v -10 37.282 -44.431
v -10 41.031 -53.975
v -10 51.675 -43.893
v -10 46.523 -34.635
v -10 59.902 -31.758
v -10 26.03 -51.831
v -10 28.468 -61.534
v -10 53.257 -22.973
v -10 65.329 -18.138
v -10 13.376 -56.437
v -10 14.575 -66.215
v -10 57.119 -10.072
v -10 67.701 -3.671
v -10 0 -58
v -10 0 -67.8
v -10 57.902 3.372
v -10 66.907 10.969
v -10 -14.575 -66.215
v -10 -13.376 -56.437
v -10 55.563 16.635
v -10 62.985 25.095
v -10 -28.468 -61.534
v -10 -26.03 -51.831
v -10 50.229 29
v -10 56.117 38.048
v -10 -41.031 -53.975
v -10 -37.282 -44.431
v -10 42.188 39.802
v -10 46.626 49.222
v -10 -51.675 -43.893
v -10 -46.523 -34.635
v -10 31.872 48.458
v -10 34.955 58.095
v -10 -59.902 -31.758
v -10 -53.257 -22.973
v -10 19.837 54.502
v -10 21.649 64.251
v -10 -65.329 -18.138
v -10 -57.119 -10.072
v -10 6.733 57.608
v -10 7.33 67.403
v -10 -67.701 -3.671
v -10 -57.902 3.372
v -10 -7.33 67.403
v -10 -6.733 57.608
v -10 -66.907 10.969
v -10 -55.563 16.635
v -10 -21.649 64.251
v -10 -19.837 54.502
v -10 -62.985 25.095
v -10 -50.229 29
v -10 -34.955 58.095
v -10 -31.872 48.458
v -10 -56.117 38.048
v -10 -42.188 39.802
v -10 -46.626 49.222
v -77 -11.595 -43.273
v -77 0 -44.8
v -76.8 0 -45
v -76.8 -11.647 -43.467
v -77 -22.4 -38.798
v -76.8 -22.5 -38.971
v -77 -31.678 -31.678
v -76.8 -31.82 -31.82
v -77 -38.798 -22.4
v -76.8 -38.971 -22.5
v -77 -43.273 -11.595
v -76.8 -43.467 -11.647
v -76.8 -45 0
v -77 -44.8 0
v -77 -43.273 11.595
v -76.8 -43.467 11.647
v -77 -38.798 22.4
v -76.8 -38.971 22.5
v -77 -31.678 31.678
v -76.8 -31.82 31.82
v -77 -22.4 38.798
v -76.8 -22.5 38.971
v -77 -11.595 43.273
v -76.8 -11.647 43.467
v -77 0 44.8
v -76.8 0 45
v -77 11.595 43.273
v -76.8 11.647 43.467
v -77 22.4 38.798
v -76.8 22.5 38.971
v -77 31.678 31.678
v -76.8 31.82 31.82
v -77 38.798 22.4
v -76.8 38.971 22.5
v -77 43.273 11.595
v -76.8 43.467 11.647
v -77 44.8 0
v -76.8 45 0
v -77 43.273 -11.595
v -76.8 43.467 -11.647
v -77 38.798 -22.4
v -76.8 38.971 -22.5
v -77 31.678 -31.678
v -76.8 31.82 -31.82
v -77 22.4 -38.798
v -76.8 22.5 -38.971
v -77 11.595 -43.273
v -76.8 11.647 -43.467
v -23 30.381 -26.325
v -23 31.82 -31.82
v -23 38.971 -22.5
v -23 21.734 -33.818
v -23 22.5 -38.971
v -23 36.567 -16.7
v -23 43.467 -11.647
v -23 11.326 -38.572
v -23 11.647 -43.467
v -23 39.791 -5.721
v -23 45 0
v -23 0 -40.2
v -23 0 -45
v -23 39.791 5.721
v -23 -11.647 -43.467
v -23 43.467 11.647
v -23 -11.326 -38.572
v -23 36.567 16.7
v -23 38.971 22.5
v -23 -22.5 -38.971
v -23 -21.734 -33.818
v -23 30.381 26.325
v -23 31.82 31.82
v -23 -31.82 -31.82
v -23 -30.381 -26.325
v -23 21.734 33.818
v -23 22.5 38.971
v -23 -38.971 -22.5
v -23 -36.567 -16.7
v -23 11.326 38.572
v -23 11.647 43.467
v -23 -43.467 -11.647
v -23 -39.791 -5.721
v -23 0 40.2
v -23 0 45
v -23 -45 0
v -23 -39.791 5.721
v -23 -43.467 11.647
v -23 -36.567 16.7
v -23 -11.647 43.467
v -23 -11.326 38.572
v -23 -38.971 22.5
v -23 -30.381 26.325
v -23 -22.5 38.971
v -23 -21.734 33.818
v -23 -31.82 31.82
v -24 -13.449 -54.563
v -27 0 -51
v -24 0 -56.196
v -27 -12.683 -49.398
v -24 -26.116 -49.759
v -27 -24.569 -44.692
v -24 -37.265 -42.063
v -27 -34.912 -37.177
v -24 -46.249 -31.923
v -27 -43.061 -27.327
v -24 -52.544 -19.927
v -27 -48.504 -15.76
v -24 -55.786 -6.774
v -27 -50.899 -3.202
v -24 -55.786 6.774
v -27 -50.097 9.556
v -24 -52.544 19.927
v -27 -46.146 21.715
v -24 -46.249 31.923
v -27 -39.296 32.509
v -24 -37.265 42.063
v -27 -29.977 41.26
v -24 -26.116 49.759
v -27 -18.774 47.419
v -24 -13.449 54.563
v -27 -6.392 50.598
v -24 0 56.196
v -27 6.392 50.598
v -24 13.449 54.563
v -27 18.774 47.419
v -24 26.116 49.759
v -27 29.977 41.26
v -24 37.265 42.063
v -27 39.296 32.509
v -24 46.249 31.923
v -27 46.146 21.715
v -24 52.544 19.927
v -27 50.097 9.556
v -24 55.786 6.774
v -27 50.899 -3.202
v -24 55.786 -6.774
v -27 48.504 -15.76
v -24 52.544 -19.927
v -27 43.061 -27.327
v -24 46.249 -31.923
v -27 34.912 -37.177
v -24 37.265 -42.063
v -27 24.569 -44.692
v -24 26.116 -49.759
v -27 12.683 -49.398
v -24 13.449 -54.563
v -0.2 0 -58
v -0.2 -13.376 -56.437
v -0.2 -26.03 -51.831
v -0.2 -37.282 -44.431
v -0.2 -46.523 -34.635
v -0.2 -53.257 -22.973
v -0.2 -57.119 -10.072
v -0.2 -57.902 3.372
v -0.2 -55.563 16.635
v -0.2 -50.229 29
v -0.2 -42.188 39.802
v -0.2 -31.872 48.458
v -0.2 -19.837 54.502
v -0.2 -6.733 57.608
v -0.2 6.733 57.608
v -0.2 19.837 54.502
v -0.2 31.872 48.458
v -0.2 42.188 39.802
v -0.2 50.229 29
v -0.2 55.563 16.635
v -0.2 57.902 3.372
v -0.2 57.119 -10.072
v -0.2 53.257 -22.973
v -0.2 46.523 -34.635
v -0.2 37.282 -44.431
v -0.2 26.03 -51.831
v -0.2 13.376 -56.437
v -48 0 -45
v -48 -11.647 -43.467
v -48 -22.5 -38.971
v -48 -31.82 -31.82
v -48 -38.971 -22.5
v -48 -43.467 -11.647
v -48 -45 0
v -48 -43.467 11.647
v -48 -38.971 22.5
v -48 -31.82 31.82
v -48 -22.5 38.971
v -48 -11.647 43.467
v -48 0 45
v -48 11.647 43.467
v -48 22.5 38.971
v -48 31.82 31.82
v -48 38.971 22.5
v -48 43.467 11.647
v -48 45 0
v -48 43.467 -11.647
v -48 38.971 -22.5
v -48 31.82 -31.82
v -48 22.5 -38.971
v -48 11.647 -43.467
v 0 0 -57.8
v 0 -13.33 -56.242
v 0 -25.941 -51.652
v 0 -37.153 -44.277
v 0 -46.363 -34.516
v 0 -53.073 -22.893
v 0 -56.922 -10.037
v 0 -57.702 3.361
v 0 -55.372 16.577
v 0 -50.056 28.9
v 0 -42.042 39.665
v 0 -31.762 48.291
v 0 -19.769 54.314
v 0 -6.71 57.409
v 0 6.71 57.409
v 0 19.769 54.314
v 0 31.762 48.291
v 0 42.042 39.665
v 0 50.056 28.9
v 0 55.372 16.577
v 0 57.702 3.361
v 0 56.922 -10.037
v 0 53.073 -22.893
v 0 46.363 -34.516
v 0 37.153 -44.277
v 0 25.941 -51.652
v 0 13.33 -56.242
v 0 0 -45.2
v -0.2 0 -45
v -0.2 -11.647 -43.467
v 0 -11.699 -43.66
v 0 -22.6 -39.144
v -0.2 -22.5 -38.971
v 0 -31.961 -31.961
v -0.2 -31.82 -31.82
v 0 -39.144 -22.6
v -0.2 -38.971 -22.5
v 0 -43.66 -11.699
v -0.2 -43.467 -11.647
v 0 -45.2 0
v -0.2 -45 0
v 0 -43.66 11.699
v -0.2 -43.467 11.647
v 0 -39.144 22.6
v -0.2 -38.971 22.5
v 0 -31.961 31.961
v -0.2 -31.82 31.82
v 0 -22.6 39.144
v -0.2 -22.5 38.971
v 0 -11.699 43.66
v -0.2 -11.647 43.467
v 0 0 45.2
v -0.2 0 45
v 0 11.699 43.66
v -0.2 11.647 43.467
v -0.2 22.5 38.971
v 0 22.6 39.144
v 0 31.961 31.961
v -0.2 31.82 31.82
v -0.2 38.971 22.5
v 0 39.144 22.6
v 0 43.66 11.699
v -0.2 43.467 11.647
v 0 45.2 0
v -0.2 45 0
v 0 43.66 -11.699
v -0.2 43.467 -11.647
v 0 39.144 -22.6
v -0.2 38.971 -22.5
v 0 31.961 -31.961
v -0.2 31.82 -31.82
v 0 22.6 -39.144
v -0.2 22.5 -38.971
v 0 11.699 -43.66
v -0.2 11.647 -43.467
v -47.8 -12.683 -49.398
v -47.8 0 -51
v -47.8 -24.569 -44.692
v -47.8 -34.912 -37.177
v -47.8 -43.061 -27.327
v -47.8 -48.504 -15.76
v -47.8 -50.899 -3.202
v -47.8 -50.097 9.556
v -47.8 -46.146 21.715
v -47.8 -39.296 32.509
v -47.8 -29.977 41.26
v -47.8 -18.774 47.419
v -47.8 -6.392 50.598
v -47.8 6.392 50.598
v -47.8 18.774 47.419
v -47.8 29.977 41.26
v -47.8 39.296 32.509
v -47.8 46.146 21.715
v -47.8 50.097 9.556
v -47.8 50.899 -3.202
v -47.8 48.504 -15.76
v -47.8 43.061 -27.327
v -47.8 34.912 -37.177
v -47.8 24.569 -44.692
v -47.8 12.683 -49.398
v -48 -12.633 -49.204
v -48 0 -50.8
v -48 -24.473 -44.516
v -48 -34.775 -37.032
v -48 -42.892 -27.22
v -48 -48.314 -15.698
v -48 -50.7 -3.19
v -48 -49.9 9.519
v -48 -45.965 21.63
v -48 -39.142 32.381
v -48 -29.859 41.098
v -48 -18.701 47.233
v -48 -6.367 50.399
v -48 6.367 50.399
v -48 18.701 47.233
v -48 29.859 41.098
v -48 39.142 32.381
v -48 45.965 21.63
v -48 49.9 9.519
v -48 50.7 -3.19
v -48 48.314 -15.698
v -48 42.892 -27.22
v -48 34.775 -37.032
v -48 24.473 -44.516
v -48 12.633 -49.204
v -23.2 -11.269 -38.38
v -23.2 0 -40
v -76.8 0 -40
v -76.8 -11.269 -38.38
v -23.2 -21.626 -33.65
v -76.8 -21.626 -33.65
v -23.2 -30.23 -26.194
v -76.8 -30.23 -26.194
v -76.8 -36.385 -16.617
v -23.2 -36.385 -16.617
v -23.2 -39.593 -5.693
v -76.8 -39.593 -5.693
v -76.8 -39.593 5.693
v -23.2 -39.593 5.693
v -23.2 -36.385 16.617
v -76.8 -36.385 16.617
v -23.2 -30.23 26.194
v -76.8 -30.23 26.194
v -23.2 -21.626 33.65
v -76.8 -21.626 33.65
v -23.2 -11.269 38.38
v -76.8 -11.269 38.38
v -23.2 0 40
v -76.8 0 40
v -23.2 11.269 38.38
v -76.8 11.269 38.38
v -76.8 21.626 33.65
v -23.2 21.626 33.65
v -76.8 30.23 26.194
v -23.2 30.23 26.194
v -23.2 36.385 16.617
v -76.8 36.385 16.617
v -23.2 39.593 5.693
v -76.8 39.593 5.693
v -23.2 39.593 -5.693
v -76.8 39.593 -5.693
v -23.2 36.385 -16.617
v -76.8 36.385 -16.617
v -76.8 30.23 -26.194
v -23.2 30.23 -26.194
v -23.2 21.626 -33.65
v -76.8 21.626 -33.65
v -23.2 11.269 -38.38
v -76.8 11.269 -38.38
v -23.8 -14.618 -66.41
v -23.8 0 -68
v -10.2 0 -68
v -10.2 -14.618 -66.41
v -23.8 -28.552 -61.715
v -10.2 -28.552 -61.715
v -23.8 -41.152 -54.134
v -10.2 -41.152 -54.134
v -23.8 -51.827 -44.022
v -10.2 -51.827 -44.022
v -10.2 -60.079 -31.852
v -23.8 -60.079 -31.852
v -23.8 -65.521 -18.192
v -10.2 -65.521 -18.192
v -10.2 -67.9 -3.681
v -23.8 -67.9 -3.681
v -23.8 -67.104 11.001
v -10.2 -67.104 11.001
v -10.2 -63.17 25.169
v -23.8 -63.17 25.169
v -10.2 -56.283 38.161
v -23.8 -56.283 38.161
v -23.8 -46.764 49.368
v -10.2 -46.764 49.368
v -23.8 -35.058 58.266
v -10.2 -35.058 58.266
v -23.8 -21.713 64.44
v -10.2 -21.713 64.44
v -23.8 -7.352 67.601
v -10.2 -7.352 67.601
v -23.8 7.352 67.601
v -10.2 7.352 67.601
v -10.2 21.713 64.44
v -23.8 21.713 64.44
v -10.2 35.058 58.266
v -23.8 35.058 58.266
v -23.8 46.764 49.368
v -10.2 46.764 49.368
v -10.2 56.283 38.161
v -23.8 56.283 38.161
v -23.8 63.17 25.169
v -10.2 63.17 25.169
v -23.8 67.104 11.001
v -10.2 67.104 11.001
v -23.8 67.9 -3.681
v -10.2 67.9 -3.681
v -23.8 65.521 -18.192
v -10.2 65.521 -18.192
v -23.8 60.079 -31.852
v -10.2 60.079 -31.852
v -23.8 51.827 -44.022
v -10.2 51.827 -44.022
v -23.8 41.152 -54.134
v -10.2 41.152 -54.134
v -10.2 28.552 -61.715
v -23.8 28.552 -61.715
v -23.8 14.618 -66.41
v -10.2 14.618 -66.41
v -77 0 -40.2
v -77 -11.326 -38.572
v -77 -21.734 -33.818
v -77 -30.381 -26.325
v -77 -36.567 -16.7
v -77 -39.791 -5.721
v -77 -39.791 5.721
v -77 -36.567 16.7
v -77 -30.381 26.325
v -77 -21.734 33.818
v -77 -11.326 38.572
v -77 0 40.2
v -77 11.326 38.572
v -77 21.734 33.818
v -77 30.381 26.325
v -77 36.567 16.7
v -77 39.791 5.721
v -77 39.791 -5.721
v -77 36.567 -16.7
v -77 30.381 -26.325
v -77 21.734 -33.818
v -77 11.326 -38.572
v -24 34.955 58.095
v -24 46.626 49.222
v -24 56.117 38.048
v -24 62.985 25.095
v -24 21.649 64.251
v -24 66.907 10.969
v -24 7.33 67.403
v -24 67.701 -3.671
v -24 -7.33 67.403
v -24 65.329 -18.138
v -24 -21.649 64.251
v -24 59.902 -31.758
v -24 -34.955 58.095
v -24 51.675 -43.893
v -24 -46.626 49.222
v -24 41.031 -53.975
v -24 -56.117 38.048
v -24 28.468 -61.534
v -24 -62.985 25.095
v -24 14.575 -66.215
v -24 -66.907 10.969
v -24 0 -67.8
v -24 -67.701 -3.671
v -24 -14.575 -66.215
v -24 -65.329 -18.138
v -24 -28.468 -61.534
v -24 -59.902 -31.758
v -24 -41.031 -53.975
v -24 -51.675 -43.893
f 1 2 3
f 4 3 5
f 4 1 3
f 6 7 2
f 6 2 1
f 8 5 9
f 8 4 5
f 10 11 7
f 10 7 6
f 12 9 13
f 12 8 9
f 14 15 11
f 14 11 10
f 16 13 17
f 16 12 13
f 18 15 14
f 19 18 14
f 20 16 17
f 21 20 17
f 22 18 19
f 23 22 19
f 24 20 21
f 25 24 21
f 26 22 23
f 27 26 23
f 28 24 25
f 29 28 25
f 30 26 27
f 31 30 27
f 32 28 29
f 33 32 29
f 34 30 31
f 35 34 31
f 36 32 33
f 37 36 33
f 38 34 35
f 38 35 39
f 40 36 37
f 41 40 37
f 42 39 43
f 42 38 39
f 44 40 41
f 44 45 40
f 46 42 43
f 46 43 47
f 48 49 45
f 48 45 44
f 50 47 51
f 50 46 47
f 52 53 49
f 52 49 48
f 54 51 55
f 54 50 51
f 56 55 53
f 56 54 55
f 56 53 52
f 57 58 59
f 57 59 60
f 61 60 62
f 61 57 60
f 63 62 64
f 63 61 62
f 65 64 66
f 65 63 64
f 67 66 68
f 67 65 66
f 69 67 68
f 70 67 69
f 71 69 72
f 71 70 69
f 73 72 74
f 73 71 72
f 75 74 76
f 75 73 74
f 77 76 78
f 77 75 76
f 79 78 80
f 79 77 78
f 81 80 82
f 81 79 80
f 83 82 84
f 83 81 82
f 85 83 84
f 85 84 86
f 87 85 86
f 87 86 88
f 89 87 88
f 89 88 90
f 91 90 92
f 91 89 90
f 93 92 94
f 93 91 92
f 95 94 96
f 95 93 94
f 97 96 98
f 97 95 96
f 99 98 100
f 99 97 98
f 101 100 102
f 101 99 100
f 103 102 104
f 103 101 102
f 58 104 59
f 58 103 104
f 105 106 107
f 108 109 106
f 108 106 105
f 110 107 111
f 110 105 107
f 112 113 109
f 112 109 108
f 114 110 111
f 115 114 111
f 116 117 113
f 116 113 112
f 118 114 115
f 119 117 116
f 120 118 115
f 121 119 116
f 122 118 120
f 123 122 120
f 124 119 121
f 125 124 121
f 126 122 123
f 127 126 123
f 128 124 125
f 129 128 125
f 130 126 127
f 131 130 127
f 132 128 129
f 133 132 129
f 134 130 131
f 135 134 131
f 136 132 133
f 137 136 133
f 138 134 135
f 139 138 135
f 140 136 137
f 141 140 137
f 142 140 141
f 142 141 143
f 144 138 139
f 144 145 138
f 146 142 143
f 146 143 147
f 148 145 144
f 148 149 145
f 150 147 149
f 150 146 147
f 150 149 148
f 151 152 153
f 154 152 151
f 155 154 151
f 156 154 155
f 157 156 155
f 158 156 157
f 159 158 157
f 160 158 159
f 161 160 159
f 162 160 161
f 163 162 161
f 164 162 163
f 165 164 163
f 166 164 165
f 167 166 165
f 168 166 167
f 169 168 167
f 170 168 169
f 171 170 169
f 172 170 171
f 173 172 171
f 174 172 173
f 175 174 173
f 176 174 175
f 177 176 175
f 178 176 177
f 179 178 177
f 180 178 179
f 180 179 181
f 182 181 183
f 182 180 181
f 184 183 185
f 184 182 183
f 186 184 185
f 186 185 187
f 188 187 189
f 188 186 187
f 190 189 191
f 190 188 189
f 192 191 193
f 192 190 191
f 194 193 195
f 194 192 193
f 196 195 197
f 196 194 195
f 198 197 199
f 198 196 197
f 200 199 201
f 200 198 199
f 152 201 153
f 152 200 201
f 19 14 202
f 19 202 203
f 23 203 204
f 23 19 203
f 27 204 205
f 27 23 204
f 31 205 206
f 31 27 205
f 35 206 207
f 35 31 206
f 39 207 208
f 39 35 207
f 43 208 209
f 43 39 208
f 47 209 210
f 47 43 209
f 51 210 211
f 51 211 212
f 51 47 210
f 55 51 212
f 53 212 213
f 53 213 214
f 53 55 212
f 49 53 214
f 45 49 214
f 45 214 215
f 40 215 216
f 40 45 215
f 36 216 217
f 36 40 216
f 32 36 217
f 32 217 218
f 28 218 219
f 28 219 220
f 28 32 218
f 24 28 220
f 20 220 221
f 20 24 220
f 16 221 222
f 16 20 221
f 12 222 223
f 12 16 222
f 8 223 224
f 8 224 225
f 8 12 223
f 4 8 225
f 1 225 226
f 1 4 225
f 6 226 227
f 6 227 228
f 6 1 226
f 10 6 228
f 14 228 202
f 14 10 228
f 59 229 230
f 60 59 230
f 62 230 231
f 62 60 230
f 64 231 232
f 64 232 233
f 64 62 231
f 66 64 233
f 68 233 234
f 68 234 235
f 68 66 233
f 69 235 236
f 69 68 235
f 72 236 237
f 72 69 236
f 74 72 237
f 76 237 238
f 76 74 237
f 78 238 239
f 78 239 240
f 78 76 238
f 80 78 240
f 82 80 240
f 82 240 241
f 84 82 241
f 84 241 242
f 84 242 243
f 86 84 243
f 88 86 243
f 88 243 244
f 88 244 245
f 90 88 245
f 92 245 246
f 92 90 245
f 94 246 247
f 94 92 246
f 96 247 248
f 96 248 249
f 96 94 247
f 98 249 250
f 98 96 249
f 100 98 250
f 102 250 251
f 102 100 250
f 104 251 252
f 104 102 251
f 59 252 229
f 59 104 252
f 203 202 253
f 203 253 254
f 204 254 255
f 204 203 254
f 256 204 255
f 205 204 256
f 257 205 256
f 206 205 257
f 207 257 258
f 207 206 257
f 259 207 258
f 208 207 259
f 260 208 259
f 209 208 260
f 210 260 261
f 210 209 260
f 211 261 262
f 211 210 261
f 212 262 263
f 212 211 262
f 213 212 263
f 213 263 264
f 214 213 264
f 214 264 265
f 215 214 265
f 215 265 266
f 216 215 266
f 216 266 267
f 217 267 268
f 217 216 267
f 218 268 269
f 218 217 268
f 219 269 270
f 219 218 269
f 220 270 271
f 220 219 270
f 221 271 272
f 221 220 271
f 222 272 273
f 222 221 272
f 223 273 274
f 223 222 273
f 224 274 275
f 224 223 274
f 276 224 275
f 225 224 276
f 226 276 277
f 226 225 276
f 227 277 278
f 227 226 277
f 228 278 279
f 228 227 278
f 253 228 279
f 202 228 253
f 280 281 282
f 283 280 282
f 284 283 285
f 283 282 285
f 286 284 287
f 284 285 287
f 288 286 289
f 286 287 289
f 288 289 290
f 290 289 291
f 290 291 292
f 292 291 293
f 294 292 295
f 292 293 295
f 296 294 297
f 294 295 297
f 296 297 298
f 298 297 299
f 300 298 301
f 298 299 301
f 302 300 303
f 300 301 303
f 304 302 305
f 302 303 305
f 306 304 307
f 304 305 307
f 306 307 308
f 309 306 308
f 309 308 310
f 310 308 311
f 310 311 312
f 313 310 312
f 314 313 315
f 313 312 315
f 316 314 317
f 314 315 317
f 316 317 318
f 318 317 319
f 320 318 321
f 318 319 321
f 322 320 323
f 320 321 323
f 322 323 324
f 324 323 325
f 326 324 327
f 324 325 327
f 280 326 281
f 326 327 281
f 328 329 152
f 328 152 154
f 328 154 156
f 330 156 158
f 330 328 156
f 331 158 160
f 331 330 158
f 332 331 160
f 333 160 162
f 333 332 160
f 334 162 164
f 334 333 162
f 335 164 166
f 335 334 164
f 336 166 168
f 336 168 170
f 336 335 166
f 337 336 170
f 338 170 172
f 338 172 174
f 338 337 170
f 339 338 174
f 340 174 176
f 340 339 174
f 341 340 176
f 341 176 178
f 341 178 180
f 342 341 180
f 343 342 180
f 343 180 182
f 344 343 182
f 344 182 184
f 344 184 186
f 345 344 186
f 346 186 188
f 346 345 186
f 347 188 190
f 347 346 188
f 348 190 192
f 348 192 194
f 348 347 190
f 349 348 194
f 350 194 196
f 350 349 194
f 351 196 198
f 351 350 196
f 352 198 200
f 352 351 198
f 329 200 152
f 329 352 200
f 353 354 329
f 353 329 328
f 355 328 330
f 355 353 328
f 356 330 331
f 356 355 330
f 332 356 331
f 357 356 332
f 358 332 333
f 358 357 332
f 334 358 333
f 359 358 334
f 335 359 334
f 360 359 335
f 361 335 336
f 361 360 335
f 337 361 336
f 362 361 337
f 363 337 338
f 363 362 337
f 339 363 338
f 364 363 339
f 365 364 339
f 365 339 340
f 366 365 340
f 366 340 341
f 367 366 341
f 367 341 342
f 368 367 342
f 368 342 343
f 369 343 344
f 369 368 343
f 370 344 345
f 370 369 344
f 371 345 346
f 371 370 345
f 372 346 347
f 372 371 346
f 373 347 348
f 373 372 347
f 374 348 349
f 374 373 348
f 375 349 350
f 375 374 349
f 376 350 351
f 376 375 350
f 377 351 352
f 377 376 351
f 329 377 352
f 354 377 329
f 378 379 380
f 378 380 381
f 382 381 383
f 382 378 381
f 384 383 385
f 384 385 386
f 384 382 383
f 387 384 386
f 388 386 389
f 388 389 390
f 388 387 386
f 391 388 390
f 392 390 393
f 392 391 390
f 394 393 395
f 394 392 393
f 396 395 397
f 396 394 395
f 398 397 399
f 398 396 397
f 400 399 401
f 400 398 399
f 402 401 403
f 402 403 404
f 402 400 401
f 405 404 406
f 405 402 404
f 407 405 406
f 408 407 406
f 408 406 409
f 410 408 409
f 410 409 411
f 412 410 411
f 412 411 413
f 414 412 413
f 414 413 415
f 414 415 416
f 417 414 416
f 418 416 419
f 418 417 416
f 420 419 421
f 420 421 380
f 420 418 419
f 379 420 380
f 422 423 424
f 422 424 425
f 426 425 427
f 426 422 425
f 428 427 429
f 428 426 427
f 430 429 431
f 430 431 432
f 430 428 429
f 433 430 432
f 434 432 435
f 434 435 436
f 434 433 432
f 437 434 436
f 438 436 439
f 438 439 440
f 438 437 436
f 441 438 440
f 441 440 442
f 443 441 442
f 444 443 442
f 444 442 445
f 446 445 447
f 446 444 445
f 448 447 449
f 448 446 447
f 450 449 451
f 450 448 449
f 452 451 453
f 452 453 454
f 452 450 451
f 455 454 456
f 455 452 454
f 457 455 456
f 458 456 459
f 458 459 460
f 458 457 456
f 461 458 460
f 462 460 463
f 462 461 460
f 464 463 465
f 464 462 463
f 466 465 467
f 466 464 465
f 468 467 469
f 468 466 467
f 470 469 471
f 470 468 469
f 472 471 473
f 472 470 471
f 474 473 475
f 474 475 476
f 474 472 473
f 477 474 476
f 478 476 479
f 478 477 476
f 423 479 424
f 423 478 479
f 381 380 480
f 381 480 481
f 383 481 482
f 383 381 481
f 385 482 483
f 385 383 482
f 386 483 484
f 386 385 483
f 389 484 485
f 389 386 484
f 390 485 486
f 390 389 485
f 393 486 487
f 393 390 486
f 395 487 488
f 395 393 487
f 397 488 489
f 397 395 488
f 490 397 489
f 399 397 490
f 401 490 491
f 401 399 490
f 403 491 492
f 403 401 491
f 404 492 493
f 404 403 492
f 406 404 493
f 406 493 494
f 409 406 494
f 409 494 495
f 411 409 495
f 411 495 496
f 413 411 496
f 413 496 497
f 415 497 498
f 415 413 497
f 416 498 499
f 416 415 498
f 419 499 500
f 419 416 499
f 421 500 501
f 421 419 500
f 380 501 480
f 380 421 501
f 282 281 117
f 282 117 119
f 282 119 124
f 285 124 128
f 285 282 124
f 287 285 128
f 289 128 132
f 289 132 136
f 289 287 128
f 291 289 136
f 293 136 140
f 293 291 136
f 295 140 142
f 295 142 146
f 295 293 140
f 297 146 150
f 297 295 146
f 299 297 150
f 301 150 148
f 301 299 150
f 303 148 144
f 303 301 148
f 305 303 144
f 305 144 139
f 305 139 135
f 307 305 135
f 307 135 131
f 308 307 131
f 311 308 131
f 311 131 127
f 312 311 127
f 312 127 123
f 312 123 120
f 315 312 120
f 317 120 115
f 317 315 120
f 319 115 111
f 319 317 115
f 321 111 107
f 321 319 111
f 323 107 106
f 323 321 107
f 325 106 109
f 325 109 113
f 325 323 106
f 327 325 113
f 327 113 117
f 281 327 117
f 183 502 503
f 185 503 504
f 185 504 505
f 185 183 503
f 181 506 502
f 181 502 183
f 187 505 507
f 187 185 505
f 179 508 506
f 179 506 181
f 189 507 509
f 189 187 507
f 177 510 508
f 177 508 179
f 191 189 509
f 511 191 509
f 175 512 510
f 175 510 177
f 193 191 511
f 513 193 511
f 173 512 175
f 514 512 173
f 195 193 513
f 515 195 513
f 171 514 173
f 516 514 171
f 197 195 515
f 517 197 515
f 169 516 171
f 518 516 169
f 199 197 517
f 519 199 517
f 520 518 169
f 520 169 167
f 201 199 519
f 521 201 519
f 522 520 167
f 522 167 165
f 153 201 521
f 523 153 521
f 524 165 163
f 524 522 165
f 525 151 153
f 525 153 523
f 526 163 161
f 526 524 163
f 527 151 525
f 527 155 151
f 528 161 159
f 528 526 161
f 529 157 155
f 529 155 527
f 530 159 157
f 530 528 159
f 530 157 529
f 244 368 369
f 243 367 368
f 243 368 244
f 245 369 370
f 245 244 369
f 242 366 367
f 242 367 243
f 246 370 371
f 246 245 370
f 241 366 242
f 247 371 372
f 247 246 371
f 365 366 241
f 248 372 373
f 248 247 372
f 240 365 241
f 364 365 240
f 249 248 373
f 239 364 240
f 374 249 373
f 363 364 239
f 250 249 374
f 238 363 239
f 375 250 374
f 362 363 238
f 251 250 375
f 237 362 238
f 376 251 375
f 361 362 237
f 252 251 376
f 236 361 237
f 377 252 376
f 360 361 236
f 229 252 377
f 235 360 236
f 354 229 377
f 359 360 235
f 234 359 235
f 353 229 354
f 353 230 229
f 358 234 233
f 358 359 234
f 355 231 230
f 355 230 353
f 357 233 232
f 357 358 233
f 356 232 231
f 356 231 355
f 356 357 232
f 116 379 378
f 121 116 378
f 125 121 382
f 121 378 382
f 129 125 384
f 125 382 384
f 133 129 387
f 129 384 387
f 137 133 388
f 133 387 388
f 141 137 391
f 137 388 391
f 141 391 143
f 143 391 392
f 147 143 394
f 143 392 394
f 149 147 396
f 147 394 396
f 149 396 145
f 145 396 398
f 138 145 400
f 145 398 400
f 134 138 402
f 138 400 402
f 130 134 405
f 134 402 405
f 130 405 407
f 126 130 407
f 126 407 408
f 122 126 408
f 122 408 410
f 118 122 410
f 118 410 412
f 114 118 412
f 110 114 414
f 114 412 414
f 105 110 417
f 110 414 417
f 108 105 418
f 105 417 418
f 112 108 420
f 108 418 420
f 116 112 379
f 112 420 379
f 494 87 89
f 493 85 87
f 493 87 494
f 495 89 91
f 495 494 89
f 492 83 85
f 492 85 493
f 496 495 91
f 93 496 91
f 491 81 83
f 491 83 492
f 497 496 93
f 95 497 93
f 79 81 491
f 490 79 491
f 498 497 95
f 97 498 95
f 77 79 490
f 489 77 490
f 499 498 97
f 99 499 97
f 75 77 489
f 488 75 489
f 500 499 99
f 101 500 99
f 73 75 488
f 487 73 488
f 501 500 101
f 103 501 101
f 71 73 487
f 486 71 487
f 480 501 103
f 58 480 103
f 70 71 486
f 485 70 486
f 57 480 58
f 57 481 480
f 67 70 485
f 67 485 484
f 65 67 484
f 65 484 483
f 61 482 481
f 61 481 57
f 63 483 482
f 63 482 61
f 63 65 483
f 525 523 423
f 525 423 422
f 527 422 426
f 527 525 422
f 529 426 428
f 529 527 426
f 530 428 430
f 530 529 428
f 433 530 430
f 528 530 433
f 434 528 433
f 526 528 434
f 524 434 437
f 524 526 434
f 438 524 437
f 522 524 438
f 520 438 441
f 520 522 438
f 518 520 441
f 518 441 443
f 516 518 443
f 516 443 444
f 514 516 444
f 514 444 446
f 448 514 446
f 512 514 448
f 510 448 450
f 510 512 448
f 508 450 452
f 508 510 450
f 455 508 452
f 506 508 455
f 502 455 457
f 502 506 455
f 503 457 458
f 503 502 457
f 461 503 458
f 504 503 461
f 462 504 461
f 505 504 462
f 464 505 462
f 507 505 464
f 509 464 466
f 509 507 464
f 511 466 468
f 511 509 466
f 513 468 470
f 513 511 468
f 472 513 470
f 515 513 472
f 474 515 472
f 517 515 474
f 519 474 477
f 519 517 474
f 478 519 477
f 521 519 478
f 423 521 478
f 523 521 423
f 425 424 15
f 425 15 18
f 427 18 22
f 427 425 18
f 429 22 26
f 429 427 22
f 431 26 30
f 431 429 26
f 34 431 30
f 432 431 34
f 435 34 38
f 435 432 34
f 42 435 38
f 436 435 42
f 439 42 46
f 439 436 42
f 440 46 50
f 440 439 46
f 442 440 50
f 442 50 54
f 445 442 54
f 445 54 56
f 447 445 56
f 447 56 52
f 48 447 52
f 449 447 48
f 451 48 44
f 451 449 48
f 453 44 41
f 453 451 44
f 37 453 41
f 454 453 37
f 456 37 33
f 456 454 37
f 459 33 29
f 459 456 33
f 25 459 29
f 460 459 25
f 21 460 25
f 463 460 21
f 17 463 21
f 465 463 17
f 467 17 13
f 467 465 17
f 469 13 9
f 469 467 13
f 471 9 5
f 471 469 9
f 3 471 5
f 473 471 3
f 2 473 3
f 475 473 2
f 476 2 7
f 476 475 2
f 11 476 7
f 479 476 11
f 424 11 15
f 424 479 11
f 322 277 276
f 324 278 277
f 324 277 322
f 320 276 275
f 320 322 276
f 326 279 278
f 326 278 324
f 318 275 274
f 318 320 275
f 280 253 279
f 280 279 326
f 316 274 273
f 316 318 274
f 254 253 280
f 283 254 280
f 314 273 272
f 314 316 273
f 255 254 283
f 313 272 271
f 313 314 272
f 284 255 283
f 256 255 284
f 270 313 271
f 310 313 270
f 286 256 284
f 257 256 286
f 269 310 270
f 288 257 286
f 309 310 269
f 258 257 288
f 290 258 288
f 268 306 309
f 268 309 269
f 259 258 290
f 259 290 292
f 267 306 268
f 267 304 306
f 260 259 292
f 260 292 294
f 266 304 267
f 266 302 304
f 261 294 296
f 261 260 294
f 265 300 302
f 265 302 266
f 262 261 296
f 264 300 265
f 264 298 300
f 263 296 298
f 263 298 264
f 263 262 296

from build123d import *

# Parameters (mm, degrees)
CHANFREIN1_SIZE = 0.2
CHANFREIN2_SIZE = 0.2


with BuildPart() as part:
    # Esquisse1 → Révolution1 (revolve)
    with BuildSketch(Plane.XY, mode=Mode.PRIVATE) as r_volution1_sk:
        Polygon((0, 45), (0, 58), (-10, 58), (-10, 68), (-24, 68), (-24, 56.196152423), (-27, 51), (-48, 51), (-48, 45), (-77, 45), (-77, 40), (-23, 40), (-23, 45), align=None)
    revolve(r_volution1_sk.sketch.rotate(Axis((0, 0, 0), (-1, 0, 0)), 90), axis=Axis((0, 0, 0), (-1, 0, 0)))  # turned: the seam where the file's is

    # Chanfrein1
    chanfrein1_edges = [part.edges().sort_by_distance(p)[0] for p in [
        (-48, 0, 51),
        (-77, 0, 45),
        (-77, 0, 40),
        (0, 0, 45),
        (0, 0, 58),
        (-10, 0, 68),
        (-24, 0, 68),
    ]]
    chamfer(chanfrein1_edges, length=CHANFREIN1_SIZE)

    # Chanfrein2
    chanfrein2_edges = [part.edges().sort_by_distance(p)[0] for p in [
        (-23, 0, 40),
    ]]
    chamfer(chanfrein2_edges, length=CHANFREIN2_SIZE)


solid = part.part
